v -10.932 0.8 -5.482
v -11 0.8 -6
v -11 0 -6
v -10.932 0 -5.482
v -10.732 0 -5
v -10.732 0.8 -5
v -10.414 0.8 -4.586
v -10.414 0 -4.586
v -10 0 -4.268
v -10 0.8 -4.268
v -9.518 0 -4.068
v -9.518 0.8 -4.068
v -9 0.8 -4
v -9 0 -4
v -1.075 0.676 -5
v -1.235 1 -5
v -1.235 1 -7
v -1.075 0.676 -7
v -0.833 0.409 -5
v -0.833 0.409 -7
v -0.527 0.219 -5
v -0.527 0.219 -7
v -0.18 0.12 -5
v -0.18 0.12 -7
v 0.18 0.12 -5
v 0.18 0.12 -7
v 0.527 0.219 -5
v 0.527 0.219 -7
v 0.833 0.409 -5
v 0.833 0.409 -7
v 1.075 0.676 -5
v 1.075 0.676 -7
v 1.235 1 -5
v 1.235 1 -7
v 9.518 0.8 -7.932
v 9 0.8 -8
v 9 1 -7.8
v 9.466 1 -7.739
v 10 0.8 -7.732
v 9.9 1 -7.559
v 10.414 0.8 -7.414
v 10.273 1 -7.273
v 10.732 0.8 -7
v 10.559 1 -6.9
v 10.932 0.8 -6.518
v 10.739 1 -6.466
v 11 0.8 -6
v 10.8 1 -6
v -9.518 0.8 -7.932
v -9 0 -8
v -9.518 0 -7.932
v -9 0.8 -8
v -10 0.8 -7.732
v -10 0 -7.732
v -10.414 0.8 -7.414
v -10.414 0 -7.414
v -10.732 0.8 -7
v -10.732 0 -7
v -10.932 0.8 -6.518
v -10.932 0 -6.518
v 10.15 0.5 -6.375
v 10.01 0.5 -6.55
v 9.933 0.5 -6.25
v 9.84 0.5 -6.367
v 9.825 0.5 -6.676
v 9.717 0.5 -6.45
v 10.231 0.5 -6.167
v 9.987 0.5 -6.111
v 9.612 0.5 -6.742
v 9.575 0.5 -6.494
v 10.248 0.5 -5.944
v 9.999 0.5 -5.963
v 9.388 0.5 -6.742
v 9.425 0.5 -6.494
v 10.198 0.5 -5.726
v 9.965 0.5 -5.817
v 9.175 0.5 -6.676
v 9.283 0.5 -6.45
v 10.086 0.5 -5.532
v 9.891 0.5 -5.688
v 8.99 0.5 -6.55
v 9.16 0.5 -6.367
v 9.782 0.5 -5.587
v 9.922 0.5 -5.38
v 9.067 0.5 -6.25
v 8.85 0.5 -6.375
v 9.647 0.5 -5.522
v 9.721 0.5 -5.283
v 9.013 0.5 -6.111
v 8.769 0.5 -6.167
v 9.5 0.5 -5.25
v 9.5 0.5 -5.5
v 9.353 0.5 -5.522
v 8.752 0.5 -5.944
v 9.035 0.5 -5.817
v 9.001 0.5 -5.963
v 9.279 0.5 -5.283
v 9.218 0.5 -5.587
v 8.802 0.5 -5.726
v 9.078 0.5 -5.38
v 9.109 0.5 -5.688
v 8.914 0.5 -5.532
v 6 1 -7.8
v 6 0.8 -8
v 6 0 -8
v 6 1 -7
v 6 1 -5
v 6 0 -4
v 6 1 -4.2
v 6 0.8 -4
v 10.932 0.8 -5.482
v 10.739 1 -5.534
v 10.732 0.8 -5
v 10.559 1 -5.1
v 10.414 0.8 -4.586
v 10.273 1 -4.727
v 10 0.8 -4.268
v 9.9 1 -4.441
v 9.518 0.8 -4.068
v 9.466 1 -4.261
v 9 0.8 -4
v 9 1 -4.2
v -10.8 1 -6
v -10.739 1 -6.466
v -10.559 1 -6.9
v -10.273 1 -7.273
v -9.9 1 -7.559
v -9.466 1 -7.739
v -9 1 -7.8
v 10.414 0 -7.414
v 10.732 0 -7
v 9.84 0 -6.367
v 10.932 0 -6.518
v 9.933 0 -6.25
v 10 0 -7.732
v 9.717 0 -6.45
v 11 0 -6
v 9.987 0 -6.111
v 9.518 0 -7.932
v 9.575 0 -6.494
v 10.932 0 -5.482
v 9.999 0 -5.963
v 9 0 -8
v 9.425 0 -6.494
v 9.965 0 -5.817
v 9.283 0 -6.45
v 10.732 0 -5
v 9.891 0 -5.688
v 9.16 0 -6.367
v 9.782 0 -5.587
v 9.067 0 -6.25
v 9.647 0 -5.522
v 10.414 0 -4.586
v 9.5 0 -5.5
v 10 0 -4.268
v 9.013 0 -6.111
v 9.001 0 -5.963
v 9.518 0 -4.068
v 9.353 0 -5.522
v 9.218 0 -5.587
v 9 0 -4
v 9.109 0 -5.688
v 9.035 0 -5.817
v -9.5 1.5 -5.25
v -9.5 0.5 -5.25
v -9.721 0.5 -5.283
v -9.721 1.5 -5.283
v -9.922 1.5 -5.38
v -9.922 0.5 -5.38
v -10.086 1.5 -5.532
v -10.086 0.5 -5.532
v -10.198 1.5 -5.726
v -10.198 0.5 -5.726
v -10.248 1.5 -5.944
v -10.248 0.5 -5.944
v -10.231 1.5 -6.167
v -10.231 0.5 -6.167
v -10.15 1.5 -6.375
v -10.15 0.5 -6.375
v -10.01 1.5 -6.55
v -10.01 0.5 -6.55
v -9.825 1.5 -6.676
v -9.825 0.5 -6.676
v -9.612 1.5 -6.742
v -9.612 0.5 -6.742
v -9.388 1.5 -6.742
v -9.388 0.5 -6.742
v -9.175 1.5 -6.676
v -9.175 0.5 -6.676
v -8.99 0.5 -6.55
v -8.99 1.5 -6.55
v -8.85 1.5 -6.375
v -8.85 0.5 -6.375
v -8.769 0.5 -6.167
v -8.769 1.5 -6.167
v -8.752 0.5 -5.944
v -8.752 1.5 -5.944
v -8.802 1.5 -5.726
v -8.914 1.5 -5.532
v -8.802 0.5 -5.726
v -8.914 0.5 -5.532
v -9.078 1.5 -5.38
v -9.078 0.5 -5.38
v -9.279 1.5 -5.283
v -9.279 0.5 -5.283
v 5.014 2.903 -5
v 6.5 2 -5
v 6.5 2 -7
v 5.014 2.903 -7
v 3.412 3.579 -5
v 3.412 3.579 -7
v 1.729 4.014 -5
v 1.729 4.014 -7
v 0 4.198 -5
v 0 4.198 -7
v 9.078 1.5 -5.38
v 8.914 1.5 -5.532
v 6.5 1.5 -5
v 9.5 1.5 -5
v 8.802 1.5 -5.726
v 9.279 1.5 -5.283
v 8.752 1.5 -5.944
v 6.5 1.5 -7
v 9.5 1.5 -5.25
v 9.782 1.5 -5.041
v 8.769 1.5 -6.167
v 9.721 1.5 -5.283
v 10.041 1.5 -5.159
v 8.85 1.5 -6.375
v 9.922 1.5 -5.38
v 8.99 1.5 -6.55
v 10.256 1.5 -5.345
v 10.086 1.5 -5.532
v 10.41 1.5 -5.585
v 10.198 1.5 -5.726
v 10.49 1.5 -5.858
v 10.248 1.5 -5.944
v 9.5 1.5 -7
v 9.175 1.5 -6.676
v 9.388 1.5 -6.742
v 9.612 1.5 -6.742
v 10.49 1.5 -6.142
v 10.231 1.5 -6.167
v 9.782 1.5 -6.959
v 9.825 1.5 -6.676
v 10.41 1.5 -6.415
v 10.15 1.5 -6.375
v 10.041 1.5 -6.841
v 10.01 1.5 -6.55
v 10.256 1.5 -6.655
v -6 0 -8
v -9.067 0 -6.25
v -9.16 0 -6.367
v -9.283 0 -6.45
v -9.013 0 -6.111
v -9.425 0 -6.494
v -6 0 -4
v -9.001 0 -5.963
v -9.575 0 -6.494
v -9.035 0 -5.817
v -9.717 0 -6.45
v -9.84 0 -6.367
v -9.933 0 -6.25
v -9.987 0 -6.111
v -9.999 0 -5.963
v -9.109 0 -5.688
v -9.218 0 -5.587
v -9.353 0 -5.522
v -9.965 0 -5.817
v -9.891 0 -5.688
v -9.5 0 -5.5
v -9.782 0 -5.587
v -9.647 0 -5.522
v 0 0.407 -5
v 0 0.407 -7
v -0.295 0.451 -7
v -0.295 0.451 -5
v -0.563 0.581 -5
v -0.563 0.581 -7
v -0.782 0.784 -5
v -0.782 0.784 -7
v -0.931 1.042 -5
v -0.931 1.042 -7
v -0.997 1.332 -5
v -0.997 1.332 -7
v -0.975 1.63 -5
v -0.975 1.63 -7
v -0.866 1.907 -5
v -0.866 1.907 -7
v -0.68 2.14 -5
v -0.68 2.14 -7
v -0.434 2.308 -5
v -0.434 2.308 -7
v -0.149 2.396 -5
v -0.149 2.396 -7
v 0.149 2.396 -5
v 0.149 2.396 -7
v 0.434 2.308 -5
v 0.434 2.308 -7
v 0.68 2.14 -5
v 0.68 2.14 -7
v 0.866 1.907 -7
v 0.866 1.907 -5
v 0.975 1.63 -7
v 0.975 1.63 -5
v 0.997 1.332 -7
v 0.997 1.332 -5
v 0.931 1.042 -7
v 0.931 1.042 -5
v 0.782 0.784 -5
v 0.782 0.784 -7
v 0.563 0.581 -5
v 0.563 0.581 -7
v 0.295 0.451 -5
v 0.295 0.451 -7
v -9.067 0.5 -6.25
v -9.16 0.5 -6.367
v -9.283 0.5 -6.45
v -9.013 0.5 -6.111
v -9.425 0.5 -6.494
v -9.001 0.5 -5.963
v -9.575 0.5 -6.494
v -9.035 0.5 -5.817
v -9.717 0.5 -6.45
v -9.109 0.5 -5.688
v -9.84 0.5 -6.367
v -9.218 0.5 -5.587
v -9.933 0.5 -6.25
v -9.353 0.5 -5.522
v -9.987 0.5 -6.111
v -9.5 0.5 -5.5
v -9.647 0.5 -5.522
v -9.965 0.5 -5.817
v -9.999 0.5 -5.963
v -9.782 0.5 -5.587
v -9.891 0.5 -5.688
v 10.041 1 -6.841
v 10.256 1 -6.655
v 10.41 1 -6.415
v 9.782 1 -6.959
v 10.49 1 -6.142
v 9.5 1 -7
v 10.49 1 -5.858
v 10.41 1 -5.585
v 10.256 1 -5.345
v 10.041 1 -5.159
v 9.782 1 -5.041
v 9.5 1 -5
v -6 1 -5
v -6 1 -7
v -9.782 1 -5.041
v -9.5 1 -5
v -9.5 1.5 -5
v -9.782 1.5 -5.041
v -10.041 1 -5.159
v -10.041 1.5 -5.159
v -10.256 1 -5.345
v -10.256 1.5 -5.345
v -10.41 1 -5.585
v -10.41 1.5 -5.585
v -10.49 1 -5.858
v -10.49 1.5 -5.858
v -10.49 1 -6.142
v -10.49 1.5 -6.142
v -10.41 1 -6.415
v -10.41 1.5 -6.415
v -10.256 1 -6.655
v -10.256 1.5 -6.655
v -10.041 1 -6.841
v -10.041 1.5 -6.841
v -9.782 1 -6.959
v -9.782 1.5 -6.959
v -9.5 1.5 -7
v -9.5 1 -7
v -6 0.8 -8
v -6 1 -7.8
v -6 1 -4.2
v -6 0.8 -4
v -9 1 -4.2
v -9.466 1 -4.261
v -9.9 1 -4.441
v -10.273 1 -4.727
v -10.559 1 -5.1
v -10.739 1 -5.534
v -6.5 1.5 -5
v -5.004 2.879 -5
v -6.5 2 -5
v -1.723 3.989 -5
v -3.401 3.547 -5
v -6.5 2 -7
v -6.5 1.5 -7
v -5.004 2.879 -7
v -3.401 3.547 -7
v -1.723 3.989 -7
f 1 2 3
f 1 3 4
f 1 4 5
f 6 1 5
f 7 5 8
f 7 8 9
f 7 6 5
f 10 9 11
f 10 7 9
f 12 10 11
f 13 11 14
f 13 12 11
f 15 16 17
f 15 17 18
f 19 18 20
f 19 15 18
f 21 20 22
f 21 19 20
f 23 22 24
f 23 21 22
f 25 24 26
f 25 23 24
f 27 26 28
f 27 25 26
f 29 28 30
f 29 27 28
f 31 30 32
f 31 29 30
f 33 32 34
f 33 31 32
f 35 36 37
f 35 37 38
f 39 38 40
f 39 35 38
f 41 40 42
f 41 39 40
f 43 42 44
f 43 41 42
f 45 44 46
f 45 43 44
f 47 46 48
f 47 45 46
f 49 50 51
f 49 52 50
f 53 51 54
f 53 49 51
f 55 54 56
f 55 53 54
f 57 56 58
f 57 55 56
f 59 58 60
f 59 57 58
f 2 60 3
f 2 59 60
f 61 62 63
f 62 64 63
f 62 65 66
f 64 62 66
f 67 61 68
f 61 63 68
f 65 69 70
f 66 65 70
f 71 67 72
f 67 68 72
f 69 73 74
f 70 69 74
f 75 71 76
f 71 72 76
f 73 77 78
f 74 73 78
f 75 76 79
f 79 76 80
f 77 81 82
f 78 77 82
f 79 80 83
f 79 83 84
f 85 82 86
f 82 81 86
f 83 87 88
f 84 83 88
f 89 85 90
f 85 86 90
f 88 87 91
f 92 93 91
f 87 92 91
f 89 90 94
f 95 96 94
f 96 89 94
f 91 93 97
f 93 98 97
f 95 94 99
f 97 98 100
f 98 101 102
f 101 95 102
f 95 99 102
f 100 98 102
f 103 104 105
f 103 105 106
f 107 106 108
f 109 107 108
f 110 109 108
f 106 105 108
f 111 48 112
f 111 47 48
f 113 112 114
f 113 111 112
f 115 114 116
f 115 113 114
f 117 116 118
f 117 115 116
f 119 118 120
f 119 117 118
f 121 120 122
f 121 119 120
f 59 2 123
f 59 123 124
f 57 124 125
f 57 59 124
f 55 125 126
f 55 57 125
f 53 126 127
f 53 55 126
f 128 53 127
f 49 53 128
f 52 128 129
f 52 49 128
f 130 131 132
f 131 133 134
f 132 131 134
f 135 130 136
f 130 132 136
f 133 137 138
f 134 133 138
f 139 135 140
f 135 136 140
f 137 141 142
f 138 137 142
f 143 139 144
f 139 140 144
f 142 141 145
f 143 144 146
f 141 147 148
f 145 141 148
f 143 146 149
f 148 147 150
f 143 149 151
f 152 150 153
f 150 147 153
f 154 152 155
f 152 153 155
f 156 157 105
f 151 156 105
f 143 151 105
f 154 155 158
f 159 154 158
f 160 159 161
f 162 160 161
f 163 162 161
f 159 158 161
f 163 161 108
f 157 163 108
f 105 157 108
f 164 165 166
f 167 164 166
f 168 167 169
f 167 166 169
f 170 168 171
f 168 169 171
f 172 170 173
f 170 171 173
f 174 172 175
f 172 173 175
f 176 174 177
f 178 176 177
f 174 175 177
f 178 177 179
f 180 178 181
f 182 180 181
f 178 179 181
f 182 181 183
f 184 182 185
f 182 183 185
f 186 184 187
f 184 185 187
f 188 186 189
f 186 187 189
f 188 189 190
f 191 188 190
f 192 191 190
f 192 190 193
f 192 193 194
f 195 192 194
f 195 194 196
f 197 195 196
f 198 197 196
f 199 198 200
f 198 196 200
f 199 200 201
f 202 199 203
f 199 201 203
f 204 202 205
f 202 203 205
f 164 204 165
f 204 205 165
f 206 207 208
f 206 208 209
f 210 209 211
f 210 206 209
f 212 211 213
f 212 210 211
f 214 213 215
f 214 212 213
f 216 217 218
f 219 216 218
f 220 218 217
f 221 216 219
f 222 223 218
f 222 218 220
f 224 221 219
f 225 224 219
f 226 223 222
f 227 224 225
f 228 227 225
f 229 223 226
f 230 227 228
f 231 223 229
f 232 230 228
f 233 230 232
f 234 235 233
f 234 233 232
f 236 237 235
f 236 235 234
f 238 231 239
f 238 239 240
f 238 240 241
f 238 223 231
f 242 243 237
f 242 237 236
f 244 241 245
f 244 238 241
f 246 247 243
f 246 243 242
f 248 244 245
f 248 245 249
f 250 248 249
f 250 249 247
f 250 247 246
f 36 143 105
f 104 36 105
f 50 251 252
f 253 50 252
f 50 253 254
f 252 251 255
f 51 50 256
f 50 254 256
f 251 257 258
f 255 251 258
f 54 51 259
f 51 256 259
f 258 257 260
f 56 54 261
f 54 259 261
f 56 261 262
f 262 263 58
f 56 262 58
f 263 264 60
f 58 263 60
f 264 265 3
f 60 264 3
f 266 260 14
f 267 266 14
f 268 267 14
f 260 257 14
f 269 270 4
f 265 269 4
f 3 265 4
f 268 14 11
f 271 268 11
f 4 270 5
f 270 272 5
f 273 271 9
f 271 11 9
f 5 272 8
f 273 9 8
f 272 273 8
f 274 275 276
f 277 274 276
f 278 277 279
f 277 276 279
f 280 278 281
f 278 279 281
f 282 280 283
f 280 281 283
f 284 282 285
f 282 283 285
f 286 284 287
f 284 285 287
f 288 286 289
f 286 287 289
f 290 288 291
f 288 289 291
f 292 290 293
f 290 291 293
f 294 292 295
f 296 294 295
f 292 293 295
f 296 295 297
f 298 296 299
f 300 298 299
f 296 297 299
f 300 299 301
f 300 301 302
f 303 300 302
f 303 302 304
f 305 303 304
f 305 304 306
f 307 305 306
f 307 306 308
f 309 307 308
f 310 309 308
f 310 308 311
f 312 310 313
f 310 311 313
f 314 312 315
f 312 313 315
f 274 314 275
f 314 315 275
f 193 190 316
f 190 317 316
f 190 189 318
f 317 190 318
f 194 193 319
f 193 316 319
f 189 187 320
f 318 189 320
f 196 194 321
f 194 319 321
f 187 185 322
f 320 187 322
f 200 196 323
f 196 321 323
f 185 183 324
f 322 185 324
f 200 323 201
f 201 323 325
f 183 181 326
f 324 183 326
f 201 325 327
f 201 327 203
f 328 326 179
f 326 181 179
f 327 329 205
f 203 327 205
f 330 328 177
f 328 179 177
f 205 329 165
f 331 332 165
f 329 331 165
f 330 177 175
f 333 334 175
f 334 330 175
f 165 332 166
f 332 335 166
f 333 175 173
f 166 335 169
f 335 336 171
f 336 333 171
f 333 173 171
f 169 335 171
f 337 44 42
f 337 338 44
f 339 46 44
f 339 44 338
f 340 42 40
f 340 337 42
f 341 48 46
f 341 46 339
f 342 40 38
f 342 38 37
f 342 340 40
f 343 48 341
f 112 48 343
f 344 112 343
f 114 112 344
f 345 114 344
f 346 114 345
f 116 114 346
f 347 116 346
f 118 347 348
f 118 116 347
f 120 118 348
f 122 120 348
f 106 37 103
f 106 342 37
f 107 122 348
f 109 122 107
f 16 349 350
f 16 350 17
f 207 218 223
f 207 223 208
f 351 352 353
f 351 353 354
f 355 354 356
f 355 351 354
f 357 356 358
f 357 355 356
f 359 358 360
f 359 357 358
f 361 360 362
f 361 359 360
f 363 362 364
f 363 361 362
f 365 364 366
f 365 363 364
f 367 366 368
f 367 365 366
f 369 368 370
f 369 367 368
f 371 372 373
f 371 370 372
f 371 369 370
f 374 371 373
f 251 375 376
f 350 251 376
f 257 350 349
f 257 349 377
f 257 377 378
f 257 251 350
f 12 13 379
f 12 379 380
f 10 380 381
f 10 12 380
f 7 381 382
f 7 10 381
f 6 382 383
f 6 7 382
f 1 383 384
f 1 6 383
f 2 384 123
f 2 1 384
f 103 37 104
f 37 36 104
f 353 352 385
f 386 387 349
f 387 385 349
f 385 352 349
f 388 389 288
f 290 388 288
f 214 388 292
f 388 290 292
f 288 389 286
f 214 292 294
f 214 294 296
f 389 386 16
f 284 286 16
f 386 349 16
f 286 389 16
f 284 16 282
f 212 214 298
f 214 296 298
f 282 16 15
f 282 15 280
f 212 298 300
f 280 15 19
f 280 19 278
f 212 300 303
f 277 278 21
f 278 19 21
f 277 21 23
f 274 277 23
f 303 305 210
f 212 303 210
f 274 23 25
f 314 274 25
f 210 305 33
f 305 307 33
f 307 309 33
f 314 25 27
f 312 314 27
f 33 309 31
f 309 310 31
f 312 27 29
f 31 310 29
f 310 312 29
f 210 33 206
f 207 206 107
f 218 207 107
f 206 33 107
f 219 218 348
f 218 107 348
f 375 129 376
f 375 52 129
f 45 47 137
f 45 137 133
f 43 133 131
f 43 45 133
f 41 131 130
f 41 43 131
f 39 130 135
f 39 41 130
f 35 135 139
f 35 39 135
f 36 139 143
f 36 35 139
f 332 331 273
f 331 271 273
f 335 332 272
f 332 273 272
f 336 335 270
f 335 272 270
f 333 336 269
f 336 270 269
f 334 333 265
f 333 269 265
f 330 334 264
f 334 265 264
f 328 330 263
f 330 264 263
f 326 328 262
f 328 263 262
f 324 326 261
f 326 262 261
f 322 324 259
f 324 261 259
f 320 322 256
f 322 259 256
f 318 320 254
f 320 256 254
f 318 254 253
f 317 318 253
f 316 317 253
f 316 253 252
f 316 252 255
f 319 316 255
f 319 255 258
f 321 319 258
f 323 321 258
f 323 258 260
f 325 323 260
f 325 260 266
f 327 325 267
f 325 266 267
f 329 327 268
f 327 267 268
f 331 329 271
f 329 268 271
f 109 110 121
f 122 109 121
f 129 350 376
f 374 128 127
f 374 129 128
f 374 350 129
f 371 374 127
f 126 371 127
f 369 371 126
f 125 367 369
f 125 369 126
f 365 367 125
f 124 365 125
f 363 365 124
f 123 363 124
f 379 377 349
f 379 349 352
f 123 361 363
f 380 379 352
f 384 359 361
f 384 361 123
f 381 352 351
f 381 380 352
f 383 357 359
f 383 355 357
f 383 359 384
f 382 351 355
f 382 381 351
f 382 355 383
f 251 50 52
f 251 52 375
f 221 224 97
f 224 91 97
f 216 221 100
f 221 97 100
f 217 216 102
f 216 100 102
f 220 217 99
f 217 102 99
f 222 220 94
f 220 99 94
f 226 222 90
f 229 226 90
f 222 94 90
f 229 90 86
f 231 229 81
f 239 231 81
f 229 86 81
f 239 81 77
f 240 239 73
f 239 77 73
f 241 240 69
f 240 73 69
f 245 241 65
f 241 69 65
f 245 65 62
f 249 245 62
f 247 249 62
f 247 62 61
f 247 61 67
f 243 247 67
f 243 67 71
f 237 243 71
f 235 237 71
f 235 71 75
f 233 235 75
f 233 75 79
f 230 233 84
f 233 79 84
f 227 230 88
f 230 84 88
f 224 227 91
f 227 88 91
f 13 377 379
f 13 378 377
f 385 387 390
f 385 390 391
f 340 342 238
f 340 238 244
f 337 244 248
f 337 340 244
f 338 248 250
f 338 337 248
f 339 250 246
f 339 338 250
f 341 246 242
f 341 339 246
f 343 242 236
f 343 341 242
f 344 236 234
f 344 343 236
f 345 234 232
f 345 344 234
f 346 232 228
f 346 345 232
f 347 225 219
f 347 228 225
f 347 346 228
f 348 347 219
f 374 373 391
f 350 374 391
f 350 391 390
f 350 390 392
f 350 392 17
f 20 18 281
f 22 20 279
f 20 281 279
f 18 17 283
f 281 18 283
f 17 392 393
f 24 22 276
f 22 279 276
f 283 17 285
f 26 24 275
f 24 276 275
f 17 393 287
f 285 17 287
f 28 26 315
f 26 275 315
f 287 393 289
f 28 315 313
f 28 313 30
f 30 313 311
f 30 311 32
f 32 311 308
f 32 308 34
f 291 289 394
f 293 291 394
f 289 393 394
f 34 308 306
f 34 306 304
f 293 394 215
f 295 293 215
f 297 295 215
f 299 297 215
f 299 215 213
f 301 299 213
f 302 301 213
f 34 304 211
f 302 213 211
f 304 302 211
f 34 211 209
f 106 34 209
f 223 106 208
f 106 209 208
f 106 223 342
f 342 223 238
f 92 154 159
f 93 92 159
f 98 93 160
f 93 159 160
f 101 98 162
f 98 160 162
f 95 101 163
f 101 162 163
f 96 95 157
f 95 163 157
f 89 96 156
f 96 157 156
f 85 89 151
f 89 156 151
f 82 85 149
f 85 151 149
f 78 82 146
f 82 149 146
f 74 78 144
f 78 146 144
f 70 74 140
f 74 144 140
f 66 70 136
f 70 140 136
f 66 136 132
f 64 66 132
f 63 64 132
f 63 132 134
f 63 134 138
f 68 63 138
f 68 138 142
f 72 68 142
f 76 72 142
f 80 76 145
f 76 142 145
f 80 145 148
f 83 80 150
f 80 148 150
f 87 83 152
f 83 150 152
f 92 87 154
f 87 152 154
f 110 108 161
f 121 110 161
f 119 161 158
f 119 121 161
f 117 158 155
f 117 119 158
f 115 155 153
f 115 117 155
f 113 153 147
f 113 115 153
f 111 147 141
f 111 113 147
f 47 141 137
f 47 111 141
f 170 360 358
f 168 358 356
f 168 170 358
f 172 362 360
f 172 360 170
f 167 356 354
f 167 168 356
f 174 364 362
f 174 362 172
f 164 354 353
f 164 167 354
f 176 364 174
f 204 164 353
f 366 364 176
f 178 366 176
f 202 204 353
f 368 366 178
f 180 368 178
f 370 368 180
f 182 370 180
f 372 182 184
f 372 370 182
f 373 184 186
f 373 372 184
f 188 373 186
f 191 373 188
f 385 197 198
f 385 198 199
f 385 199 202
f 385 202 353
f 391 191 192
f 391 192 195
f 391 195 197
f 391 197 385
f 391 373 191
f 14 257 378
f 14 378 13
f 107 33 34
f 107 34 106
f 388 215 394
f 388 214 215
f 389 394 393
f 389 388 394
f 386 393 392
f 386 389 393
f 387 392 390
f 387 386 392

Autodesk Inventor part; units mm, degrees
ref_plane "YZ Plane" through (0, 0, 0) normal (1, 0, 0) x (0, 1, 0)
ref_plane "XZ Plane" through (0, 0, 0) normal (0, 1, 0) x (-1, 0, 0)
sketch "Sketch1" plane through (0, 0, 0) normal (0, 1, 0) x (-1, 0, 0)
  line L0 (11, -8) -> (6, -8)
  line L1 (6, -8) -> (6, -4)
  line L2 (6, -4) -> (11, -4)
  line L3 (11, -4) -> (11, -8)
  line L4 (-6, -4) -> (-11, -4)
  line L5 (-11, -4) -> (-11, -8)
  line L6 (-11, -8) -> (-6, -8)
  line L7 (-6, -8) -> (-6, -4)
  point P0 (0, 0)
  dimension "d0" = 5
  dimension "d1" = 4
  dimension "d2" = 6
  dimension "d3" = 4
  dimension "d4" = 5
  dimension "d5" = 4
  dimension "d6" = 6
  dimension "d7" = 4
extrude "Extrusion1" add sketch "Sketch1" along normal blind 1
ref_plane "Work Plane1" through (0, 0, -5) normal (0, 0, 1) x (1, 0, 0)
sketch "Sketch3" plane through (0, 0, -5) normal (0, 0, 1) x (1, 0, 0)
  line L0 (11, 1) -> (11, 0) projected
  line L1 (11, 0) -> (6, 0) projected
  line L2 (6, 0) -> (6, 1) projected
  line L3 (6, 1) -> (11, 1) projected
  line L4 (-6, 1) -> (-6, 0) projected
  line L5 (-6, 0) -> (-11, 0) projected
  line L6 (-11, 0) -> (-11, 1) projected
  line L7 (-11, 1) -> (-6, 1) projected
  line L8 (-6, 1) -> (-11, 1) projected
  line L9 (6.5, 1) -> (6.5, 2)
  line L10 (-6.5, 2) -> (-6.5, 1)
  arc A0 (-1.2346, 1) -> (1.2346, 1) centre (0, 1.407) ccw
  line L11 (-6.5, 1) -> (-1.2346, 1)
  line L12 (1.2346, 1) -> (6.5, 1)
  arc A1 (0, 4.1975) -> (-6.5, 2) centre (0.6617, -8.4719) ccw
  arc A2 (6.5, 2) -> (0, 4.1975) centre (-0.3857, -7.6555) ccw
  line L13 (6.5, 2) -> (6, 2)
  line L14 (-6, 2) -> (-6.5, 2)
  point P0 (0, 0)
  point P1 (6, 1)
  dimension "d11" = 13
  dimension "d12" = 1
  dimension "d13" = 6.5
  dimension "d14" = 2.6
extrude "Extrusion2" add sketch "Sketch3" against normal blind 2 contours L3 L12 A0 L11 L7 L10 A1 A2 L9
sketch "Sketch4" plane through (0, 1, 0) normal (0, 1, 0) x (1, 0, 0)
  line L0 (0, 7) -> (-6.5, 7) projected
  line L1 (-6.5, 7) -> (-9.5, 7)
  line L2 (-9.5, 7) -> (-9.5, 5)
  line L3 (-9.5, 5) -> (-6.5, 5)
  line L4 (-6.5, 5) -> (-6.5, 7)
  arc A0 (-9.5, 7) -> (-9.5, 5) centre (-9.5, 6) ccw
  line L5 (6.5, 5) -> (6, 5) projected
  line L6 (6.5, 5) -> (9.5, 5)
  line L7 (9.5, 5) -> (9.5, 7)
  line L8 (9.5, 7) -> (6.5, 7)
  line L9 (6.5, 7) -> (6.5, 5)
  arc A1 (9.5, 5) -> (9.5, 7) centre (9.5, 6) ccw
  point P0 (0, 0)
  dimension "d17" = 3
  dimension "d18" = 2
  dimension "d19" = 1
  dimension "d20" = 3
  dimension "d21" = 2
  dimension "d22" = 1
extrude "Extrusion3" add sketch "Sketch4" along normal blind 0.5
sketch "Sketch5" plane through (0, 1.5, 0) normal (0, 1, 0) x (1, 0, 0)
  arc A0 (-9.5, 7) -> (-9.5, 5) centre (-9.5, 6) ccw projected
  point P0 (0, 0)
hole "Hole1" at (-9.5, 1.5, -6) direction (0, -1, 0) diameter 1 end through all counterbore diameter 1.5 counterbore depth 1
sketch "Sketch6" plane through (0, 1.5, 0) normal (0, 1, 0) x (1, 0, 0)
  arc A0 (9.5, 5) -> (9.5, 7) centre (9.5, 6) ccw projected
  point P0 (0, 0)
hole "Hole2" at (9.5, 1.5, -6) direction (0, -1, 0) diameter 1 end through all counterbore diameter 1.5 counterbore depth 1
sketch "Sketch7" plane through (0, 0, -5) normal (0, 0, 1) x (1, 0, 0)
  arc A0 (-1.2346, 1) -> (1.2346, 1) centre (0, 1.407) ccw projected
  point P0 (0, 0)
hole "Hole3" at (0, 1.407, -5) direction (0, 0, -1) diameter 2 end through all
fillet "Fillet1" radius 2 4 edges at (-11, 0.5, -4) (-11, 0.5, -8) (11, 0.5, -8) (11, 0.5, -4)
chamfer "Chamfer1" distance 0.2 angle 45 3 edges at (-7.5003, 1, -4) (-10.4144, 1, -4.5856) (-7.5003, 1, -8)
chamfer "Chamfer2" distance 0.2 angle 45 3 edges at (7.5002, 1, -4) (10.4144, 1, -7.4144) (7.5002, 1, -8)
properties part number "camfer,fillet dan holes"
